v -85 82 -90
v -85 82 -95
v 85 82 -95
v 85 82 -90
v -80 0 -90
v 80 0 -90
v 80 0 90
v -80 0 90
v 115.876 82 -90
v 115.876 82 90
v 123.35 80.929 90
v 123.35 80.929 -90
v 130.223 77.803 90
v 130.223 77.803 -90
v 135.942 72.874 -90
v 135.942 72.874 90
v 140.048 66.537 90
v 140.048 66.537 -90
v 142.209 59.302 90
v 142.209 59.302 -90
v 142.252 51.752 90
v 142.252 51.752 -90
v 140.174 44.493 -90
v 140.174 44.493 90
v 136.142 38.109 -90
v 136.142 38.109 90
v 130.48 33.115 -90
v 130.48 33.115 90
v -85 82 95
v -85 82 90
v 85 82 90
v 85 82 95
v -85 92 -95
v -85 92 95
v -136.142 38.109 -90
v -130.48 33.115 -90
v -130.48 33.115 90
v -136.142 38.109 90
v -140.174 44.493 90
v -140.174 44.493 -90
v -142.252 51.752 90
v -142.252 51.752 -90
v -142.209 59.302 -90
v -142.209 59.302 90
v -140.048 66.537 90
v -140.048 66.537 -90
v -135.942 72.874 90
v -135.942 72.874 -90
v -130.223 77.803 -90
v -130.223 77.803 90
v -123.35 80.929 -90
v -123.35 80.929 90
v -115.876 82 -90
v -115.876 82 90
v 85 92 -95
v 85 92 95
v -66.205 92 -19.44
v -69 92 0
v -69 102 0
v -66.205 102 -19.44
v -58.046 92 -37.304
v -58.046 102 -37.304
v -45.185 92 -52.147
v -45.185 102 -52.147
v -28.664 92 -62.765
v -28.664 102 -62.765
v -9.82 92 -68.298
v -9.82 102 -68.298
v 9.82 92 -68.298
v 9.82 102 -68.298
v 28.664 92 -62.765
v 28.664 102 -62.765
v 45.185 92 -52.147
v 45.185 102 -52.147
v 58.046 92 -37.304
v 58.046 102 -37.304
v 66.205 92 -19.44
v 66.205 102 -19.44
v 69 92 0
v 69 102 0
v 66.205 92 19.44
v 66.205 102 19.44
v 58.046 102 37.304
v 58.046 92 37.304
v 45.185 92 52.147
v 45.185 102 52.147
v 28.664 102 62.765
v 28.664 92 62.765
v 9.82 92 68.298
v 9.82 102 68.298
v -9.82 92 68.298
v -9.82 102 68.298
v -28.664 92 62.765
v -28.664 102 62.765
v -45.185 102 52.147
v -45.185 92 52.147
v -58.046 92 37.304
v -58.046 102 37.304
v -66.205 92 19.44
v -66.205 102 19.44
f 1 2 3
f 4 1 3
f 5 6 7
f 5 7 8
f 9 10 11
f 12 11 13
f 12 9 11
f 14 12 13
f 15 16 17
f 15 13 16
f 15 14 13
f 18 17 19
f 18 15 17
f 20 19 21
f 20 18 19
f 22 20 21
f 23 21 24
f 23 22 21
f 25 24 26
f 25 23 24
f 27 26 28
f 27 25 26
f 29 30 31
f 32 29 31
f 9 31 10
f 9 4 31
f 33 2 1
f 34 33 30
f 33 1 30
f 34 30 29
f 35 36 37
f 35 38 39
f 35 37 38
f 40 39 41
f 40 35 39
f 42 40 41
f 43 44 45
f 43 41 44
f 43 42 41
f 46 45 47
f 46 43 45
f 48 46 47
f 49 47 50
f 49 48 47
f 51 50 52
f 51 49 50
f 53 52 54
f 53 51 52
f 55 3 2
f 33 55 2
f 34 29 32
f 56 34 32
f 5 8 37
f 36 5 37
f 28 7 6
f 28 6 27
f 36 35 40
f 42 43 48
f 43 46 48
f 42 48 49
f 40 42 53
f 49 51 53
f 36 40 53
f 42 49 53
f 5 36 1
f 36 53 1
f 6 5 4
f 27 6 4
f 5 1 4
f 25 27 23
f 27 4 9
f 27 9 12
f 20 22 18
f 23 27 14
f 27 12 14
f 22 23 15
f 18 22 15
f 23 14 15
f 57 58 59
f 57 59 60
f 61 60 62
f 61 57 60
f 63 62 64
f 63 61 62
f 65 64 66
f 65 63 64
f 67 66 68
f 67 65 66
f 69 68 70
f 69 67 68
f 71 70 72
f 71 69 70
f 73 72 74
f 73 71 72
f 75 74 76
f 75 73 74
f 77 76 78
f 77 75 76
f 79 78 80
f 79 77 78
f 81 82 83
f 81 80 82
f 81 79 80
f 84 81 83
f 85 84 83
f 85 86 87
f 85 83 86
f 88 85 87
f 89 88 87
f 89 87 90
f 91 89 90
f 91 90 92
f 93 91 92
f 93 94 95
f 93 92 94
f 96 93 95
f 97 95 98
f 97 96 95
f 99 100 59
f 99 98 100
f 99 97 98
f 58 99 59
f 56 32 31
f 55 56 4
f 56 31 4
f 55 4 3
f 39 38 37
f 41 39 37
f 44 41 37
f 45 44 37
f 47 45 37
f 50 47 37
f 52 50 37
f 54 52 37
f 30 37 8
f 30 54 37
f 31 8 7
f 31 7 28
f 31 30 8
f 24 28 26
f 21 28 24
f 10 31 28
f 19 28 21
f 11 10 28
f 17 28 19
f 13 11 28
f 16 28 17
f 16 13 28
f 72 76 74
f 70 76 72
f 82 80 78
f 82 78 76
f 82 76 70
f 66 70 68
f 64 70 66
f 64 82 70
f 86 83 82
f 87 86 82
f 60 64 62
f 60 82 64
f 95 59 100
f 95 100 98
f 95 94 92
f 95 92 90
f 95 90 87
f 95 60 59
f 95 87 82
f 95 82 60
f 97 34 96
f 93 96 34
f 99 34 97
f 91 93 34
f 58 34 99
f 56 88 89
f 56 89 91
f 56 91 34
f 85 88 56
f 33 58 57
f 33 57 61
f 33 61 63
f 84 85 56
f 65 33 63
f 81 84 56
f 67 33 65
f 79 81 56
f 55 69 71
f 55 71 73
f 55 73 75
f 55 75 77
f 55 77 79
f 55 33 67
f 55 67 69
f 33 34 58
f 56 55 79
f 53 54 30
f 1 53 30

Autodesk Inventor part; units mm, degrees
ref_plane "YZ Plane" through (0, 0, 0) normal (1, 0, 0) x (0, 1, 0)
ref_plane "XZ Plane" through (0, 0, 0) normal (0, 1, 0) x (-1, 0, 0)
ref_plane "XY Plane" through (0, 0, 0) normal (0, 0, 1) x (1, 0, 0)
sketch "Sketch1" plane through (0, 0, 0) normal (0, 0, 1) x (1, 0, 0)
  line L0 (-142.5, 102) -> (142.5, 102) construction
  line L1 (142.5, 102) -> (142.5, 82) construction
  line L2 (142.5, 0) -> (-142.5, 0)
  line L3 (-142.5, 0) -> (-142.5, 82)
  line L4 (-142.5, 82) -> (142.5, 82)
  line L5 (142.5, 82) -> (142.5, 0)
  line L6 (80, 0) -> (142.5, 41)
  circle A0 centre (115.876, 55.376) radius 26.624
  line L7 (-142.5, 82) -> (-142.5, 102) construction
  line L8 (-80, 0) -> (-142.5, 41)
  circle A1 centre (-115.876, 55.376) radius 26.624
  point P0 (0, 0)
  point P1 (0, 0)
  point P2 (-130.4796, 33.1146)
  point P3 (130.4796, 33.1146)
  point P4 (115.876, 82)
  point P5 (-115.876, 82)
  dimension "d7" = 285
  dimension "d8" = 102
  dimension "d9" = 82
  dimension "d13" = 80
  dimension "d14" = 80
extrude "Extrusion1" add sketch "Sketch1" along normal mid plane 180 contours L2 L8 A1 L4 A0 L6 | A0 | A1
sketch "Sketch2" plane through (-115.876, 82, 90) normal (0, 1, 0) x (1, 0, 0)
  line L0 (30.876, -5) -> (200.876, -5)
  line L1 (200.876, -5) -> (200.876, 185)
  line L2 (200.876, 185) -> (30.876, 185)
  line L3 (30.876, 185) -> (30.876, -5)
  line L4 (30.876, -5) -> (200.876, 185) construction
  point P0 (115.876, 90)
  point P1 (115.876, 90)
  dimension "d17" = 190
  dimension "d18" = 170
extrude "Extrusion2" add sketch "Sketch2" along normal blind 10
sketch "Sketch3" plane through (0, 0, 0) normal (0, 1, 0) x (-1, 0, 0)
  circle A0 centre (0, 0) radius 69
  dimension "d21" = 138
extrude "Extrusion3" add sketch "Sketch3" along normal blind 102
equation "\"d14\" = d13"
properties part number "Roller platform"
